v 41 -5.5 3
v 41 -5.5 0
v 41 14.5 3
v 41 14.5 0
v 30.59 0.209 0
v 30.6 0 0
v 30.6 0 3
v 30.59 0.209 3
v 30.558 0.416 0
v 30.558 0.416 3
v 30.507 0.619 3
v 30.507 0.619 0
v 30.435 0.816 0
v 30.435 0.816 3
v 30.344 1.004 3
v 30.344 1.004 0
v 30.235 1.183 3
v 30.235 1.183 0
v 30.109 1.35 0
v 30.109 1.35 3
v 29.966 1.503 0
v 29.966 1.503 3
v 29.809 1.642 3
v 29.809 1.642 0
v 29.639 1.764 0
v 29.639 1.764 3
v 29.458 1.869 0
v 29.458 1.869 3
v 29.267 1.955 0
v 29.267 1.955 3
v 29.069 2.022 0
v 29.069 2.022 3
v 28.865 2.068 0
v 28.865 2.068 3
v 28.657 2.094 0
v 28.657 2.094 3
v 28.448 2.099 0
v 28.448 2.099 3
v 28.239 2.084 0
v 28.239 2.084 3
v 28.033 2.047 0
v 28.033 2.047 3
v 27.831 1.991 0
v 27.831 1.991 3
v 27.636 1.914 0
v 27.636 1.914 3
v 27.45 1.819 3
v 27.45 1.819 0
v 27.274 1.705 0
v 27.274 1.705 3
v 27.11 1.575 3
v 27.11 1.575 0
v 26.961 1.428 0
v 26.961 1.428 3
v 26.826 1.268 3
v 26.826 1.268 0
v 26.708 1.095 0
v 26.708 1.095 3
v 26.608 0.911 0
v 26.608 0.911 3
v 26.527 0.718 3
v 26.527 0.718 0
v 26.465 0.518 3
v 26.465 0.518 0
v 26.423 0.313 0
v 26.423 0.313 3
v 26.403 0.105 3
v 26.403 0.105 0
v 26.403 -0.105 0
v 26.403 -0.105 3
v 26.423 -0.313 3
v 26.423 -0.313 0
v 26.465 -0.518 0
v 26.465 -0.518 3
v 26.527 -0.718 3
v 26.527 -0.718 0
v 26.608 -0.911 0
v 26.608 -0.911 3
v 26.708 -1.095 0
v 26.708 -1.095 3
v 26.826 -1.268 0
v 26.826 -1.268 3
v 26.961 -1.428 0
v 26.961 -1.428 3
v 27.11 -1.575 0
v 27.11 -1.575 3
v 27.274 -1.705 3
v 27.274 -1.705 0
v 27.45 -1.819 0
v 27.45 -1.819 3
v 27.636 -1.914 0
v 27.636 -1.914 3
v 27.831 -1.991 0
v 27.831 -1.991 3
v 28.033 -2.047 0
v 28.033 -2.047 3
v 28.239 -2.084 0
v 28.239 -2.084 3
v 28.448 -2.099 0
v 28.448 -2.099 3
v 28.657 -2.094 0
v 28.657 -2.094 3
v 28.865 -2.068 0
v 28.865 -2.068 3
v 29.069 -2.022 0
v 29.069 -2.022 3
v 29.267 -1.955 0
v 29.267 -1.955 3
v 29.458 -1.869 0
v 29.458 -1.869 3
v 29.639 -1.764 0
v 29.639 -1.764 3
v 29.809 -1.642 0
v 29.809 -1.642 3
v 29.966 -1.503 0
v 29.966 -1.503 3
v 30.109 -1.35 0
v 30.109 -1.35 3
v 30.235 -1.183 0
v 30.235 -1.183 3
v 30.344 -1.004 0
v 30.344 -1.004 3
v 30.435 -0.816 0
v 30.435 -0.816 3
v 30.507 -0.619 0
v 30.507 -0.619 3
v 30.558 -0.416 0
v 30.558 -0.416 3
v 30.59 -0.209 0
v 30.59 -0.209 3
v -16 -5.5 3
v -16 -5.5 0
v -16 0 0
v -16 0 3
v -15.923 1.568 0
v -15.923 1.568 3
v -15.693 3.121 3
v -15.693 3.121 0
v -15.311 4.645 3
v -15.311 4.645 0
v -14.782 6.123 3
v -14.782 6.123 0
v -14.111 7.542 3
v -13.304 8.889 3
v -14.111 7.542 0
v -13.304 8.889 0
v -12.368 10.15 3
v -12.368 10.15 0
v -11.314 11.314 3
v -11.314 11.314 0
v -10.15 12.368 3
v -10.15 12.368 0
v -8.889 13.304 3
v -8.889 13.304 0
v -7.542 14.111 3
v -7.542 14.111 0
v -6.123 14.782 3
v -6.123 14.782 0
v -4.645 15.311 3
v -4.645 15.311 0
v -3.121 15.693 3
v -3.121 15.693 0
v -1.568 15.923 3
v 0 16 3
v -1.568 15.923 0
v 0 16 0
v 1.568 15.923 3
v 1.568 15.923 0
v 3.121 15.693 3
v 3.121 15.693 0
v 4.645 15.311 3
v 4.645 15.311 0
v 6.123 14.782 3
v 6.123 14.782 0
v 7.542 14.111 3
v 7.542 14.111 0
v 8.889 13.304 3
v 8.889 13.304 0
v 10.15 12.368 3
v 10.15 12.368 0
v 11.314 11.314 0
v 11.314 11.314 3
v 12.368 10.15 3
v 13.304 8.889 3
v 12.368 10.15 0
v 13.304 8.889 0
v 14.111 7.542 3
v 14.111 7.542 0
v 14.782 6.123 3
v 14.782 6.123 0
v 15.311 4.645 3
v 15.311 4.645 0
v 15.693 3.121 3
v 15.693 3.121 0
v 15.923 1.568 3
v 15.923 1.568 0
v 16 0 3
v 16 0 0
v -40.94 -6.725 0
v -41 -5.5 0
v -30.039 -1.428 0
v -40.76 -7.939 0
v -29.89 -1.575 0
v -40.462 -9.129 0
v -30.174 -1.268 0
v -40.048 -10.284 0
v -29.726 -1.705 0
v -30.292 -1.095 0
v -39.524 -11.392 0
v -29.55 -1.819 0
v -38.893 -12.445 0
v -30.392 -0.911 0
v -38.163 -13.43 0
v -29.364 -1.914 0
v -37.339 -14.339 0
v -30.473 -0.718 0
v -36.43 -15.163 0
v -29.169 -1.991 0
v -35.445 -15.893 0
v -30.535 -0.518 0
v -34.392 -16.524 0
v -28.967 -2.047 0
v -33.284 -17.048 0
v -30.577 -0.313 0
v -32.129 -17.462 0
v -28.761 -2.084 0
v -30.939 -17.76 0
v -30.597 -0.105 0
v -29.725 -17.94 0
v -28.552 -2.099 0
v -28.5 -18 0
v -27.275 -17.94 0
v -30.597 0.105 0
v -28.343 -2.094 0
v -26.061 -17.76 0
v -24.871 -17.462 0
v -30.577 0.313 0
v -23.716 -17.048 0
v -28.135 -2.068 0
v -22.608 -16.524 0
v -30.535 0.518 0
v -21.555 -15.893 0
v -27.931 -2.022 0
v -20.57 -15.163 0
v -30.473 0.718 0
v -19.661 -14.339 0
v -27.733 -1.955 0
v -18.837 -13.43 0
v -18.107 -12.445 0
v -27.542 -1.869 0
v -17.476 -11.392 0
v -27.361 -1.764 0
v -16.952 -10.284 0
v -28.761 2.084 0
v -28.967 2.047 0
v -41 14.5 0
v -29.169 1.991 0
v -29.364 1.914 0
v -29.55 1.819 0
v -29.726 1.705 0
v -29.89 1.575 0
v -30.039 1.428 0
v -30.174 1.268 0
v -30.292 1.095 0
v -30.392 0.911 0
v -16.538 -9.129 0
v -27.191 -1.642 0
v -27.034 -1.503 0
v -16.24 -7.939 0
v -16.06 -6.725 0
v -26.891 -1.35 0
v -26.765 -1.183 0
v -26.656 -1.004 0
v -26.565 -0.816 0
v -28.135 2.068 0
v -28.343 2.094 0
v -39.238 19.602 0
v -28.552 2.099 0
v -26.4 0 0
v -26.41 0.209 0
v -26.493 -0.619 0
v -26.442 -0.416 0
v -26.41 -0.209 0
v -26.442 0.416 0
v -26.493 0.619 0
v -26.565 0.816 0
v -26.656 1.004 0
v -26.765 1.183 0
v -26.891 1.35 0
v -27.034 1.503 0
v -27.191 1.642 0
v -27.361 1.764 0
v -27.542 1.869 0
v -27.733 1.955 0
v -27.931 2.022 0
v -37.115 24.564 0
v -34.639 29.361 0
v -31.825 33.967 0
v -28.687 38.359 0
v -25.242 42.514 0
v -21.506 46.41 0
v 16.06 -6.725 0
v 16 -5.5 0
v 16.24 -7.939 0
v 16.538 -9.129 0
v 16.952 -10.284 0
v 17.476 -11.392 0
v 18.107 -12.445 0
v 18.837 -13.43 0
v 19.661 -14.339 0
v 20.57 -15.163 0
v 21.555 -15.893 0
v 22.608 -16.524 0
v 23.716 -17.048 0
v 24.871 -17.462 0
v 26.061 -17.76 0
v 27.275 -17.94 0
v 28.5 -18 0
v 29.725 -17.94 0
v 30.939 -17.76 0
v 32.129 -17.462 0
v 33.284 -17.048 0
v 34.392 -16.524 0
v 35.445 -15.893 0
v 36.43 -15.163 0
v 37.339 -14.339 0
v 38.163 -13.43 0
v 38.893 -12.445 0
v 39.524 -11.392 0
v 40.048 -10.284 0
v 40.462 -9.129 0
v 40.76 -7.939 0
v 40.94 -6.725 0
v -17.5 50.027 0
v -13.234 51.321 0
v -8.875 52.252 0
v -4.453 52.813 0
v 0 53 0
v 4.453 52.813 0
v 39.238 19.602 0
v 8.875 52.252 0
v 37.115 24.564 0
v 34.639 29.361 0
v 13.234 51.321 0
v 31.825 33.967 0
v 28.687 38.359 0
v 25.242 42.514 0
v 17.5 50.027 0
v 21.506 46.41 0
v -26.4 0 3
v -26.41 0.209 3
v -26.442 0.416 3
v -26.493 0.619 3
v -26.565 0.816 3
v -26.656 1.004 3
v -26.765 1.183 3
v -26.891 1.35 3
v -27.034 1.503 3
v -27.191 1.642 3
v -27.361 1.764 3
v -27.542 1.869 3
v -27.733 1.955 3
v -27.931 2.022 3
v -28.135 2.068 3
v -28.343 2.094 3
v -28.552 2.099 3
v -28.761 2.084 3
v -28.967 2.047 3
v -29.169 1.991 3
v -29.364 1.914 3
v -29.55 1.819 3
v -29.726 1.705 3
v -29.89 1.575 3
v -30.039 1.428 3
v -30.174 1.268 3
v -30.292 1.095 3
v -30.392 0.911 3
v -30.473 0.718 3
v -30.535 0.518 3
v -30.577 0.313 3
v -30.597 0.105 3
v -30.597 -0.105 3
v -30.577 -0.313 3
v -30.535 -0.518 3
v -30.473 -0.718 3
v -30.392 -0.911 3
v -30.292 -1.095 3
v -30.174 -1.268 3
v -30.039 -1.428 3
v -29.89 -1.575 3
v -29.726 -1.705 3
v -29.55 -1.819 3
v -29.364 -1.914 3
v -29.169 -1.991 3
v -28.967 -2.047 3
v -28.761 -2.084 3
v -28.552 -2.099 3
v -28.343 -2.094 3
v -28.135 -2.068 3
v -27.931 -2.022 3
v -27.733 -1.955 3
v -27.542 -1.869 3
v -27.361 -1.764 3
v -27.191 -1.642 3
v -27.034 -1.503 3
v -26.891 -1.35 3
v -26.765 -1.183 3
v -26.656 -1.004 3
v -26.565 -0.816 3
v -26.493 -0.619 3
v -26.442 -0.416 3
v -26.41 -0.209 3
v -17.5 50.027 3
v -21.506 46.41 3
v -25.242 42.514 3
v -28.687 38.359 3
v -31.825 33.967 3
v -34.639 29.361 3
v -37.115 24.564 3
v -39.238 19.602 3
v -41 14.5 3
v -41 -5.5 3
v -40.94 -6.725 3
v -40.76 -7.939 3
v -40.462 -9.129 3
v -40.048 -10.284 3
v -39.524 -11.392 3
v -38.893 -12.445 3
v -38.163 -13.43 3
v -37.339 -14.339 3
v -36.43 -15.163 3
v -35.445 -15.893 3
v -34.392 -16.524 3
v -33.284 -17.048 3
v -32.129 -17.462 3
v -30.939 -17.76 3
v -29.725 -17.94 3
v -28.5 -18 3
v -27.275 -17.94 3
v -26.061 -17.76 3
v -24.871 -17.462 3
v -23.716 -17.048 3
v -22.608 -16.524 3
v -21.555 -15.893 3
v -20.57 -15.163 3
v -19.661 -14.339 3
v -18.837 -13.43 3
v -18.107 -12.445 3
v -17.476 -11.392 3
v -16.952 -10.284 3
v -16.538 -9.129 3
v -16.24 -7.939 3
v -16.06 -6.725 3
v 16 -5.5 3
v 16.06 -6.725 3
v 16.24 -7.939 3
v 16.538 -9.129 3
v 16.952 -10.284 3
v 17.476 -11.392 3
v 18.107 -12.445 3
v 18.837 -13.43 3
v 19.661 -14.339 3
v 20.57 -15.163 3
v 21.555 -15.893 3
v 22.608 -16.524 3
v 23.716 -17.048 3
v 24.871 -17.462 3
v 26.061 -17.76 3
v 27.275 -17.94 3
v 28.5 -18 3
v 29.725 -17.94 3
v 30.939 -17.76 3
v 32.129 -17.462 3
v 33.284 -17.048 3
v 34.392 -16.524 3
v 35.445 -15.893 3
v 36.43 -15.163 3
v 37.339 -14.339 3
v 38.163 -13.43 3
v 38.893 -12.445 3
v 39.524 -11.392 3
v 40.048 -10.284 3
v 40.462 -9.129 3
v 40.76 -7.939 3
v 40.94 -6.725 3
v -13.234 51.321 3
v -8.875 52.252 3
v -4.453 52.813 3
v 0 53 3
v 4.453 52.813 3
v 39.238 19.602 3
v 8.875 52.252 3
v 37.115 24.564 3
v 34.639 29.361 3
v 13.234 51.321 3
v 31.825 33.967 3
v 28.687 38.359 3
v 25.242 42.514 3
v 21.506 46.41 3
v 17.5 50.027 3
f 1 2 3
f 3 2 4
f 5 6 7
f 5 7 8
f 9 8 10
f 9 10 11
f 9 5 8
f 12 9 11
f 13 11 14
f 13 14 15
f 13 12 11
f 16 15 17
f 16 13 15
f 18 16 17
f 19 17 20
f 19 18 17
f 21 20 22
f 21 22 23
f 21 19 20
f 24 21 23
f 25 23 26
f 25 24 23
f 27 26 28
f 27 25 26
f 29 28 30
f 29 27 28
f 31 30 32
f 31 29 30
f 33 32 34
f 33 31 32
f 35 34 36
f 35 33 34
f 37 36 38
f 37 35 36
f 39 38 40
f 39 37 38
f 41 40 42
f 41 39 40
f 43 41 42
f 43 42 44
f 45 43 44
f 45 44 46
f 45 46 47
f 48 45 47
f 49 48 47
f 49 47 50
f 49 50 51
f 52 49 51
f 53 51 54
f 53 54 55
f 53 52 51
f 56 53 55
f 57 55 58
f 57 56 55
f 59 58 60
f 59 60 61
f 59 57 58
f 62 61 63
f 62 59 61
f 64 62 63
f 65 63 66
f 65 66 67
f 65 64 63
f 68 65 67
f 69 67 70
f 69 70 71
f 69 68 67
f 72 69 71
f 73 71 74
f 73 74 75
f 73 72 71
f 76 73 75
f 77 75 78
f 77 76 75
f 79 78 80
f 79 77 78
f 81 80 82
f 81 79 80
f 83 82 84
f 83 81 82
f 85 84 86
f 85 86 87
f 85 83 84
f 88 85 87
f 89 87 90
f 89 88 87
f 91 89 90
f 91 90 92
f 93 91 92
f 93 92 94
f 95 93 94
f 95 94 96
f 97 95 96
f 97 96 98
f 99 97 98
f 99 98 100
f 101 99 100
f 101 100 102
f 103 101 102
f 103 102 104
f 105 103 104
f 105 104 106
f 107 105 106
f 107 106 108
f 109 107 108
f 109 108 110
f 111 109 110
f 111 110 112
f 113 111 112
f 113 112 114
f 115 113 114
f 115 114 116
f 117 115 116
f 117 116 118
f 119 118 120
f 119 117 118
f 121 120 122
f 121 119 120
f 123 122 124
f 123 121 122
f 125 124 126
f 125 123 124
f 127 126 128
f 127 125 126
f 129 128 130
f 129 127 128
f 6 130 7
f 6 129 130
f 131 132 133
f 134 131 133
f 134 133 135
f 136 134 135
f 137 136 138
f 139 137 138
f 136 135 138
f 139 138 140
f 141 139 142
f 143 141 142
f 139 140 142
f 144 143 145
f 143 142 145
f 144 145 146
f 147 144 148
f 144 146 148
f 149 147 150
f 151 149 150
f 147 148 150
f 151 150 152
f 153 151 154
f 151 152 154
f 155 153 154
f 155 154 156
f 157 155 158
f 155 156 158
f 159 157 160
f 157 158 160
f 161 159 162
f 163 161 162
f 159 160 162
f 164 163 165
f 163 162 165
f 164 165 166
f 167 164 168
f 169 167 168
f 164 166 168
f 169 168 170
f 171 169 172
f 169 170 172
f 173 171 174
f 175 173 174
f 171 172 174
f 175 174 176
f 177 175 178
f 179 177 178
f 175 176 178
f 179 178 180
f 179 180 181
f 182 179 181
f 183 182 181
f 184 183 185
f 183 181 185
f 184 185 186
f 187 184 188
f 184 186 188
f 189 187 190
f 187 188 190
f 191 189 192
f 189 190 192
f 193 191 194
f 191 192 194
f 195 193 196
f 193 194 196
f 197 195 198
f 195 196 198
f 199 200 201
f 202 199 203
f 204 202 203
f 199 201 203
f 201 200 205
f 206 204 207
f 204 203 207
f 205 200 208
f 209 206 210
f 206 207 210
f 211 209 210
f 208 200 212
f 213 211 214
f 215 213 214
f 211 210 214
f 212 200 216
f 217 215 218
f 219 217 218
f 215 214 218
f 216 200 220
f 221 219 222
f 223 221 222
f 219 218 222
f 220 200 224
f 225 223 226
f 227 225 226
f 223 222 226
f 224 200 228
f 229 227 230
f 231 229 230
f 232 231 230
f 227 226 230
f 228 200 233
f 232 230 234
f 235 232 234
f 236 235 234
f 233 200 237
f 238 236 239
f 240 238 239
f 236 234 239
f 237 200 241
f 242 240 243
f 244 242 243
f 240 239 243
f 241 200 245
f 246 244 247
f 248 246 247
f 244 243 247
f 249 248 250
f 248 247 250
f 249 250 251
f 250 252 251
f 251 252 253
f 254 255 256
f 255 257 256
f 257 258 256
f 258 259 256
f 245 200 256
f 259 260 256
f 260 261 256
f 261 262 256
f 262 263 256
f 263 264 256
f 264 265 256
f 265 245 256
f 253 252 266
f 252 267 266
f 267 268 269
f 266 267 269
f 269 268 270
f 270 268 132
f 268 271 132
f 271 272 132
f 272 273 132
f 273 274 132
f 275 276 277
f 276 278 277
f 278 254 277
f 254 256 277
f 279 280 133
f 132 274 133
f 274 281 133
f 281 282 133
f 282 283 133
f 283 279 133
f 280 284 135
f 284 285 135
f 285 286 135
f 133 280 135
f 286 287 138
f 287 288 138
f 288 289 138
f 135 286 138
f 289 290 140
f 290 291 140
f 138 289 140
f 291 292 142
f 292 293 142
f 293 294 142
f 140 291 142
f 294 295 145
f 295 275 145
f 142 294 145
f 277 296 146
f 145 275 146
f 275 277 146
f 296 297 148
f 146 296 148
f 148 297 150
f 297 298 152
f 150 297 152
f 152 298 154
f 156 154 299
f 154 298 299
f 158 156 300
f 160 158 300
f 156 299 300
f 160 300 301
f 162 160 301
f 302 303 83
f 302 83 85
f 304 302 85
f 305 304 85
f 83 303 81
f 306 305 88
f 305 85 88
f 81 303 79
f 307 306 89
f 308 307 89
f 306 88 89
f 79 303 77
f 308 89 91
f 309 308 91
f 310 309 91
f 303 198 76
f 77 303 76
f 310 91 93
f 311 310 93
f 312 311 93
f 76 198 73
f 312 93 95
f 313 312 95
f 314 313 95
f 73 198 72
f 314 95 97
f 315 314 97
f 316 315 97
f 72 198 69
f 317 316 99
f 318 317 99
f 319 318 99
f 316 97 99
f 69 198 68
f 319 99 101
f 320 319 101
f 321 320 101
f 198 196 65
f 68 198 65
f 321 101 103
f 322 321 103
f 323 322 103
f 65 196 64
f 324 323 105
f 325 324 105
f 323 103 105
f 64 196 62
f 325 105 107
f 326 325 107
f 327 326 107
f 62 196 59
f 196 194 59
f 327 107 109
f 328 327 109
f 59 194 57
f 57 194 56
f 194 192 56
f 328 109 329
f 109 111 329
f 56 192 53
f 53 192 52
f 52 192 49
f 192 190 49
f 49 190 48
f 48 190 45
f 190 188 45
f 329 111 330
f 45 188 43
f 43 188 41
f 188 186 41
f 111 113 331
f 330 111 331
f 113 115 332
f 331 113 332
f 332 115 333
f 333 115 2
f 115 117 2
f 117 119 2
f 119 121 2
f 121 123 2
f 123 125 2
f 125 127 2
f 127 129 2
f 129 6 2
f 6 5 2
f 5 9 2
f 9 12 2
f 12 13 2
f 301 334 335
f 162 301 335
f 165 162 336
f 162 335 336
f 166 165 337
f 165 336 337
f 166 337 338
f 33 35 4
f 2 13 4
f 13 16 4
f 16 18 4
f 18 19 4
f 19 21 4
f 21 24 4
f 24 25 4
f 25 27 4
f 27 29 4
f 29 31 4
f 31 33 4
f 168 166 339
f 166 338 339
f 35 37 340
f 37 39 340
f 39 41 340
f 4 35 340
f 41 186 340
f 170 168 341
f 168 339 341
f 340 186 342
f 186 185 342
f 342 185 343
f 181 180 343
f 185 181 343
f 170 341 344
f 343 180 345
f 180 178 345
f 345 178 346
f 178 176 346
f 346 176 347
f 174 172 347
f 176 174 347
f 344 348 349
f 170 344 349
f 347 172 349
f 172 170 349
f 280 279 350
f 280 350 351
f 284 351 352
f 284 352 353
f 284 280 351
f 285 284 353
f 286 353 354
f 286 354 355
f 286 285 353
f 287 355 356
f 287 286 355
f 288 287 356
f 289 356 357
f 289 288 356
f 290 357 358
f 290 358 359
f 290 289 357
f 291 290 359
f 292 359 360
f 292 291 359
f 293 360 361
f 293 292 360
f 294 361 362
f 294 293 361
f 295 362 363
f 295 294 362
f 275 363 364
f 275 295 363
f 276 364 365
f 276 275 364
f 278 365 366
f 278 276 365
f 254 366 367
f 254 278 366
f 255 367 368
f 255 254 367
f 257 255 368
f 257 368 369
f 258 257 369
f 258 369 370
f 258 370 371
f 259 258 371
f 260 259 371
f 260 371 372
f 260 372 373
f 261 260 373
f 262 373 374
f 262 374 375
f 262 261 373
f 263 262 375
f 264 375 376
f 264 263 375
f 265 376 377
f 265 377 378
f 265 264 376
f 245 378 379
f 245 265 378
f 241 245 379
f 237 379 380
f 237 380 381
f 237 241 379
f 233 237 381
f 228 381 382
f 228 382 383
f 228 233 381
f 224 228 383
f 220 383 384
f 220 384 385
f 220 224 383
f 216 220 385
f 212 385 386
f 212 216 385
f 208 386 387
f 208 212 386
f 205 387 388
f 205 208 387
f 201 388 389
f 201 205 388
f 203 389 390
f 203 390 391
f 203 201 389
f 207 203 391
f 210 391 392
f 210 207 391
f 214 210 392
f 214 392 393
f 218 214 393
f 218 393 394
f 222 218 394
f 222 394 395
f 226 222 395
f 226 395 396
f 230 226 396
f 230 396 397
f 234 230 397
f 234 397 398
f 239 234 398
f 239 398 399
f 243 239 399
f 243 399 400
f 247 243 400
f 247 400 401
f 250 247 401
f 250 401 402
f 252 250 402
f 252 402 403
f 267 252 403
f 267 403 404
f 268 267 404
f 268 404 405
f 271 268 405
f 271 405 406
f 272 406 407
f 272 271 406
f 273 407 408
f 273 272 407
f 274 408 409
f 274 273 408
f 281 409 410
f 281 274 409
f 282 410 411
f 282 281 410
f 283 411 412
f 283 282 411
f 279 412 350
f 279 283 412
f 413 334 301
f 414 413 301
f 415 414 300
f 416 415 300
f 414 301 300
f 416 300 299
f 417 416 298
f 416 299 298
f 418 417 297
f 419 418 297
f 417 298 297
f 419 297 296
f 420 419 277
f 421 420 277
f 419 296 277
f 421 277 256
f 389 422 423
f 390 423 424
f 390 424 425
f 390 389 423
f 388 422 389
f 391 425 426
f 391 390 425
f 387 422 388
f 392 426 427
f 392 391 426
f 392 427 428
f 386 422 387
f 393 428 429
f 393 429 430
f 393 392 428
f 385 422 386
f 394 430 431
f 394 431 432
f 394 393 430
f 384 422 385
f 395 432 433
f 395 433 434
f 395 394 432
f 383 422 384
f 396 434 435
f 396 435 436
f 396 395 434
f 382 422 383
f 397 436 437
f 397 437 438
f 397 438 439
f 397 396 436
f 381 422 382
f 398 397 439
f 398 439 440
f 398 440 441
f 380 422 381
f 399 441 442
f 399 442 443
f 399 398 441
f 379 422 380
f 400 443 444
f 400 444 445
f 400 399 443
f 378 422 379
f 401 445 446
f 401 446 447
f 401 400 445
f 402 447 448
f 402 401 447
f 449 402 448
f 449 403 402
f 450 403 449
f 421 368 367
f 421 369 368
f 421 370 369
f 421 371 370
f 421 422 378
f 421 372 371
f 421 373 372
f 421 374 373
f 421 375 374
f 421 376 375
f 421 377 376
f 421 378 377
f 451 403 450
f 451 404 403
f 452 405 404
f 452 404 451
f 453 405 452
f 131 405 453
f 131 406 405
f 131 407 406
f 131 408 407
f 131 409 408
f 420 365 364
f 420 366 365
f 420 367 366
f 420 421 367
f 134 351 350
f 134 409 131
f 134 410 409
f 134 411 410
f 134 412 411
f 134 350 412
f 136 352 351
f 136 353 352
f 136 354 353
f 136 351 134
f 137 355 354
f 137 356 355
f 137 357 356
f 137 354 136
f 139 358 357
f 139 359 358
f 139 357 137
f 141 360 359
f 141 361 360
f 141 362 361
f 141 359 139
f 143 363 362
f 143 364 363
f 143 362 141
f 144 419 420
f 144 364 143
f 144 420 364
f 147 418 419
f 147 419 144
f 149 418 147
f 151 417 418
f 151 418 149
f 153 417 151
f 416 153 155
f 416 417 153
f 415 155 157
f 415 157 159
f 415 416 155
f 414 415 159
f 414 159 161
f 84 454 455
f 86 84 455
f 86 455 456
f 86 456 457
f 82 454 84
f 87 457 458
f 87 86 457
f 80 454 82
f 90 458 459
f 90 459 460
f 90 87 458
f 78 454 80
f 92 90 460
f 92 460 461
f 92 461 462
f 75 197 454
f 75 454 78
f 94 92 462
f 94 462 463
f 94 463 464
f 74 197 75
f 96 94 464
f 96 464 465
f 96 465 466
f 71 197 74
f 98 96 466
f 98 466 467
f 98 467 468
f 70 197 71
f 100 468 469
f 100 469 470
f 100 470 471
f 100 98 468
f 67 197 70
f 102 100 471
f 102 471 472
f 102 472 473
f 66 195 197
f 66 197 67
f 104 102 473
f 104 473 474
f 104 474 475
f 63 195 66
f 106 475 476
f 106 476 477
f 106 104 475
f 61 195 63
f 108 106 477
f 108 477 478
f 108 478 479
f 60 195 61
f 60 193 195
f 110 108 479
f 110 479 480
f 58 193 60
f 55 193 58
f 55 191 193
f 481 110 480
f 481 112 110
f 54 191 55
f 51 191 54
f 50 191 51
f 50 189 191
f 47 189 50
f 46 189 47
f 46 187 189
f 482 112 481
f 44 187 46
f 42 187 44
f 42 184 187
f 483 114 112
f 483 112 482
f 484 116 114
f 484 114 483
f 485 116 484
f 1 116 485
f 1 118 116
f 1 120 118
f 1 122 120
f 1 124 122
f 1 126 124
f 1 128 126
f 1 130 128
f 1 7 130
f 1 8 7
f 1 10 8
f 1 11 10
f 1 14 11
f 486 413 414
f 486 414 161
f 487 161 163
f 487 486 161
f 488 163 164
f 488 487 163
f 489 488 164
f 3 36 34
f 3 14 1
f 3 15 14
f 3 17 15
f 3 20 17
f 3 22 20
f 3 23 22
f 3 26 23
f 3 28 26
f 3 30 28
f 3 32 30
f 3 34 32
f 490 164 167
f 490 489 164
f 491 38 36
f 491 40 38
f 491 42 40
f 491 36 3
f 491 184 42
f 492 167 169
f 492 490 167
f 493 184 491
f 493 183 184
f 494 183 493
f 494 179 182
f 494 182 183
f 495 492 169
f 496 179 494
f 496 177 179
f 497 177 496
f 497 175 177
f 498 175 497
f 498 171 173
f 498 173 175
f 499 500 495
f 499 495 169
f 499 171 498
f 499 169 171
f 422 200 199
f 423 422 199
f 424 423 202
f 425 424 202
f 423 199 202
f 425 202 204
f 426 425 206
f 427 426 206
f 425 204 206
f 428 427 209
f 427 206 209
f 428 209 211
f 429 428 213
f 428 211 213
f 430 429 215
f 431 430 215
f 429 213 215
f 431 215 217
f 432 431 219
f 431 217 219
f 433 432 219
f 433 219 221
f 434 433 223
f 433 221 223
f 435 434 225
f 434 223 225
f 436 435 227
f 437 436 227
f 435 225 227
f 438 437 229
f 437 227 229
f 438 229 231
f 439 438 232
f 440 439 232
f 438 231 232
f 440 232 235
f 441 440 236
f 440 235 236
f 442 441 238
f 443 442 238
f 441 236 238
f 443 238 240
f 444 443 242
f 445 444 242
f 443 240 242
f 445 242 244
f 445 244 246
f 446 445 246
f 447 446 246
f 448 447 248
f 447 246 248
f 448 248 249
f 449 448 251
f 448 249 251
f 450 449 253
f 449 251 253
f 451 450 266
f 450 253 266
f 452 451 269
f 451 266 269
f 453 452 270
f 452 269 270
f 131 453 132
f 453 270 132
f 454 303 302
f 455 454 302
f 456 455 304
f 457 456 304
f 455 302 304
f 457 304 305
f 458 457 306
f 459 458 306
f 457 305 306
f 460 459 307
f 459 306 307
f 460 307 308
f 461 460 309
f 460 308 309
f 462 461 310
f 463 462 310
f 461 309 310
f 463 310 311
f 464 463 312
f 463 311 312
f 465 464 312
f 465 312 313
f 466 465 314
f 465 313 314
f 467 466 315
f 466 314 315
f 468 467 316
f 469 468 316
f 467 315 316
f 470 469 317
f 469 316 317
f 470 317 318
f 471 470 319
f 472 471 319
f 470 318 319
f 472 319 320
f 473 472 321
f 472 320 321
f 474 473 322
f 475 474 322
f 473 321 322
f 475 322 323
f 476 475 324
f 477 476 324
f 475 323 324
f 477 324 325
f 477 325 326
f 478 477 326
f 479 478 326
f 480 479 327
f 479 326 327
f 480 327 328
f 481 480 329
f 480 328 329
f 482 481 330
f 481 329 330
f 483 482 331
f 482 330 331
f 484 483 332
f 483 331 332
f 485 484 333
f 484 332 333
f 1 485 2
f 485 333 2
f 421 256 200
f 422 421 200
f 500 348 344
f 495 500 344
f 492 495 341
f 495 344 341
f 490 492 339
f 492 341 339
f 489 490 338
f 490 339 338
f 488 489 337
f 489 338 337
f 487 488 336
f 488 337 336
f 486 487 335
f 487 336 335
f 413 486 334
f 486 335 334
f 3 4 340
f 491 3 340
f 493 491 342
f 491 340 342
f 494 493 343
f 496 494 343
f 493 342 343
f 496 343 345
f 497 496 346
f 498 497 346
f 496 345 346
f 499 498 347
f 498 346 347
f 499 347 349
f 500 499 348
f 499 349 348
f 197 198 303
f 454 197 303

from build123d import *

# Parameters (mm, degrees)
F0_R     = 2.1
F1_DEPTH = 3


with BuildPart() as f1:
    # F0 (on Top) → F1 (new body)
    with BuildSketch(Plane.XY):
        with BuildLine():
            Line((-41, 14.5), (-41, -5.5))
            ThreePointArc((-41, -5.5), (-28.5, -18), (-16, -5.5))
            Line((-16, -5.5), (-16, 0))
            ThreePointArc((-16, 0), (0, 16), (16, 0))
            Line((16, 0), (16, -5.5))
            ThreePointArc((16, -5.5), (28.5, -18), (41, -5.5))
            Line((41, -5.5), (41, 14.5))
            ThreePointArc((41, 14.5), (31.825248, 33.967169), (17.5, 50.027492))
            ThreePointArc((17.5, 50.027492), (0, 53), (-17.5, 50.027492))
            ThreePointArc((-17.5, 50.027492), (-31.825248, 33.967169), (-41, 14.5))
        make_face()
        with Locations((-28.5, 0)):
            Circle(F0_R, mode=Mode.SUBTRACT)
        with Locations((28.5, 0)):
            Circle(F0_R, mode=Mode.SUBTRACT)
    extrude(amount=F1_DEPTH)


solid = f1.part
